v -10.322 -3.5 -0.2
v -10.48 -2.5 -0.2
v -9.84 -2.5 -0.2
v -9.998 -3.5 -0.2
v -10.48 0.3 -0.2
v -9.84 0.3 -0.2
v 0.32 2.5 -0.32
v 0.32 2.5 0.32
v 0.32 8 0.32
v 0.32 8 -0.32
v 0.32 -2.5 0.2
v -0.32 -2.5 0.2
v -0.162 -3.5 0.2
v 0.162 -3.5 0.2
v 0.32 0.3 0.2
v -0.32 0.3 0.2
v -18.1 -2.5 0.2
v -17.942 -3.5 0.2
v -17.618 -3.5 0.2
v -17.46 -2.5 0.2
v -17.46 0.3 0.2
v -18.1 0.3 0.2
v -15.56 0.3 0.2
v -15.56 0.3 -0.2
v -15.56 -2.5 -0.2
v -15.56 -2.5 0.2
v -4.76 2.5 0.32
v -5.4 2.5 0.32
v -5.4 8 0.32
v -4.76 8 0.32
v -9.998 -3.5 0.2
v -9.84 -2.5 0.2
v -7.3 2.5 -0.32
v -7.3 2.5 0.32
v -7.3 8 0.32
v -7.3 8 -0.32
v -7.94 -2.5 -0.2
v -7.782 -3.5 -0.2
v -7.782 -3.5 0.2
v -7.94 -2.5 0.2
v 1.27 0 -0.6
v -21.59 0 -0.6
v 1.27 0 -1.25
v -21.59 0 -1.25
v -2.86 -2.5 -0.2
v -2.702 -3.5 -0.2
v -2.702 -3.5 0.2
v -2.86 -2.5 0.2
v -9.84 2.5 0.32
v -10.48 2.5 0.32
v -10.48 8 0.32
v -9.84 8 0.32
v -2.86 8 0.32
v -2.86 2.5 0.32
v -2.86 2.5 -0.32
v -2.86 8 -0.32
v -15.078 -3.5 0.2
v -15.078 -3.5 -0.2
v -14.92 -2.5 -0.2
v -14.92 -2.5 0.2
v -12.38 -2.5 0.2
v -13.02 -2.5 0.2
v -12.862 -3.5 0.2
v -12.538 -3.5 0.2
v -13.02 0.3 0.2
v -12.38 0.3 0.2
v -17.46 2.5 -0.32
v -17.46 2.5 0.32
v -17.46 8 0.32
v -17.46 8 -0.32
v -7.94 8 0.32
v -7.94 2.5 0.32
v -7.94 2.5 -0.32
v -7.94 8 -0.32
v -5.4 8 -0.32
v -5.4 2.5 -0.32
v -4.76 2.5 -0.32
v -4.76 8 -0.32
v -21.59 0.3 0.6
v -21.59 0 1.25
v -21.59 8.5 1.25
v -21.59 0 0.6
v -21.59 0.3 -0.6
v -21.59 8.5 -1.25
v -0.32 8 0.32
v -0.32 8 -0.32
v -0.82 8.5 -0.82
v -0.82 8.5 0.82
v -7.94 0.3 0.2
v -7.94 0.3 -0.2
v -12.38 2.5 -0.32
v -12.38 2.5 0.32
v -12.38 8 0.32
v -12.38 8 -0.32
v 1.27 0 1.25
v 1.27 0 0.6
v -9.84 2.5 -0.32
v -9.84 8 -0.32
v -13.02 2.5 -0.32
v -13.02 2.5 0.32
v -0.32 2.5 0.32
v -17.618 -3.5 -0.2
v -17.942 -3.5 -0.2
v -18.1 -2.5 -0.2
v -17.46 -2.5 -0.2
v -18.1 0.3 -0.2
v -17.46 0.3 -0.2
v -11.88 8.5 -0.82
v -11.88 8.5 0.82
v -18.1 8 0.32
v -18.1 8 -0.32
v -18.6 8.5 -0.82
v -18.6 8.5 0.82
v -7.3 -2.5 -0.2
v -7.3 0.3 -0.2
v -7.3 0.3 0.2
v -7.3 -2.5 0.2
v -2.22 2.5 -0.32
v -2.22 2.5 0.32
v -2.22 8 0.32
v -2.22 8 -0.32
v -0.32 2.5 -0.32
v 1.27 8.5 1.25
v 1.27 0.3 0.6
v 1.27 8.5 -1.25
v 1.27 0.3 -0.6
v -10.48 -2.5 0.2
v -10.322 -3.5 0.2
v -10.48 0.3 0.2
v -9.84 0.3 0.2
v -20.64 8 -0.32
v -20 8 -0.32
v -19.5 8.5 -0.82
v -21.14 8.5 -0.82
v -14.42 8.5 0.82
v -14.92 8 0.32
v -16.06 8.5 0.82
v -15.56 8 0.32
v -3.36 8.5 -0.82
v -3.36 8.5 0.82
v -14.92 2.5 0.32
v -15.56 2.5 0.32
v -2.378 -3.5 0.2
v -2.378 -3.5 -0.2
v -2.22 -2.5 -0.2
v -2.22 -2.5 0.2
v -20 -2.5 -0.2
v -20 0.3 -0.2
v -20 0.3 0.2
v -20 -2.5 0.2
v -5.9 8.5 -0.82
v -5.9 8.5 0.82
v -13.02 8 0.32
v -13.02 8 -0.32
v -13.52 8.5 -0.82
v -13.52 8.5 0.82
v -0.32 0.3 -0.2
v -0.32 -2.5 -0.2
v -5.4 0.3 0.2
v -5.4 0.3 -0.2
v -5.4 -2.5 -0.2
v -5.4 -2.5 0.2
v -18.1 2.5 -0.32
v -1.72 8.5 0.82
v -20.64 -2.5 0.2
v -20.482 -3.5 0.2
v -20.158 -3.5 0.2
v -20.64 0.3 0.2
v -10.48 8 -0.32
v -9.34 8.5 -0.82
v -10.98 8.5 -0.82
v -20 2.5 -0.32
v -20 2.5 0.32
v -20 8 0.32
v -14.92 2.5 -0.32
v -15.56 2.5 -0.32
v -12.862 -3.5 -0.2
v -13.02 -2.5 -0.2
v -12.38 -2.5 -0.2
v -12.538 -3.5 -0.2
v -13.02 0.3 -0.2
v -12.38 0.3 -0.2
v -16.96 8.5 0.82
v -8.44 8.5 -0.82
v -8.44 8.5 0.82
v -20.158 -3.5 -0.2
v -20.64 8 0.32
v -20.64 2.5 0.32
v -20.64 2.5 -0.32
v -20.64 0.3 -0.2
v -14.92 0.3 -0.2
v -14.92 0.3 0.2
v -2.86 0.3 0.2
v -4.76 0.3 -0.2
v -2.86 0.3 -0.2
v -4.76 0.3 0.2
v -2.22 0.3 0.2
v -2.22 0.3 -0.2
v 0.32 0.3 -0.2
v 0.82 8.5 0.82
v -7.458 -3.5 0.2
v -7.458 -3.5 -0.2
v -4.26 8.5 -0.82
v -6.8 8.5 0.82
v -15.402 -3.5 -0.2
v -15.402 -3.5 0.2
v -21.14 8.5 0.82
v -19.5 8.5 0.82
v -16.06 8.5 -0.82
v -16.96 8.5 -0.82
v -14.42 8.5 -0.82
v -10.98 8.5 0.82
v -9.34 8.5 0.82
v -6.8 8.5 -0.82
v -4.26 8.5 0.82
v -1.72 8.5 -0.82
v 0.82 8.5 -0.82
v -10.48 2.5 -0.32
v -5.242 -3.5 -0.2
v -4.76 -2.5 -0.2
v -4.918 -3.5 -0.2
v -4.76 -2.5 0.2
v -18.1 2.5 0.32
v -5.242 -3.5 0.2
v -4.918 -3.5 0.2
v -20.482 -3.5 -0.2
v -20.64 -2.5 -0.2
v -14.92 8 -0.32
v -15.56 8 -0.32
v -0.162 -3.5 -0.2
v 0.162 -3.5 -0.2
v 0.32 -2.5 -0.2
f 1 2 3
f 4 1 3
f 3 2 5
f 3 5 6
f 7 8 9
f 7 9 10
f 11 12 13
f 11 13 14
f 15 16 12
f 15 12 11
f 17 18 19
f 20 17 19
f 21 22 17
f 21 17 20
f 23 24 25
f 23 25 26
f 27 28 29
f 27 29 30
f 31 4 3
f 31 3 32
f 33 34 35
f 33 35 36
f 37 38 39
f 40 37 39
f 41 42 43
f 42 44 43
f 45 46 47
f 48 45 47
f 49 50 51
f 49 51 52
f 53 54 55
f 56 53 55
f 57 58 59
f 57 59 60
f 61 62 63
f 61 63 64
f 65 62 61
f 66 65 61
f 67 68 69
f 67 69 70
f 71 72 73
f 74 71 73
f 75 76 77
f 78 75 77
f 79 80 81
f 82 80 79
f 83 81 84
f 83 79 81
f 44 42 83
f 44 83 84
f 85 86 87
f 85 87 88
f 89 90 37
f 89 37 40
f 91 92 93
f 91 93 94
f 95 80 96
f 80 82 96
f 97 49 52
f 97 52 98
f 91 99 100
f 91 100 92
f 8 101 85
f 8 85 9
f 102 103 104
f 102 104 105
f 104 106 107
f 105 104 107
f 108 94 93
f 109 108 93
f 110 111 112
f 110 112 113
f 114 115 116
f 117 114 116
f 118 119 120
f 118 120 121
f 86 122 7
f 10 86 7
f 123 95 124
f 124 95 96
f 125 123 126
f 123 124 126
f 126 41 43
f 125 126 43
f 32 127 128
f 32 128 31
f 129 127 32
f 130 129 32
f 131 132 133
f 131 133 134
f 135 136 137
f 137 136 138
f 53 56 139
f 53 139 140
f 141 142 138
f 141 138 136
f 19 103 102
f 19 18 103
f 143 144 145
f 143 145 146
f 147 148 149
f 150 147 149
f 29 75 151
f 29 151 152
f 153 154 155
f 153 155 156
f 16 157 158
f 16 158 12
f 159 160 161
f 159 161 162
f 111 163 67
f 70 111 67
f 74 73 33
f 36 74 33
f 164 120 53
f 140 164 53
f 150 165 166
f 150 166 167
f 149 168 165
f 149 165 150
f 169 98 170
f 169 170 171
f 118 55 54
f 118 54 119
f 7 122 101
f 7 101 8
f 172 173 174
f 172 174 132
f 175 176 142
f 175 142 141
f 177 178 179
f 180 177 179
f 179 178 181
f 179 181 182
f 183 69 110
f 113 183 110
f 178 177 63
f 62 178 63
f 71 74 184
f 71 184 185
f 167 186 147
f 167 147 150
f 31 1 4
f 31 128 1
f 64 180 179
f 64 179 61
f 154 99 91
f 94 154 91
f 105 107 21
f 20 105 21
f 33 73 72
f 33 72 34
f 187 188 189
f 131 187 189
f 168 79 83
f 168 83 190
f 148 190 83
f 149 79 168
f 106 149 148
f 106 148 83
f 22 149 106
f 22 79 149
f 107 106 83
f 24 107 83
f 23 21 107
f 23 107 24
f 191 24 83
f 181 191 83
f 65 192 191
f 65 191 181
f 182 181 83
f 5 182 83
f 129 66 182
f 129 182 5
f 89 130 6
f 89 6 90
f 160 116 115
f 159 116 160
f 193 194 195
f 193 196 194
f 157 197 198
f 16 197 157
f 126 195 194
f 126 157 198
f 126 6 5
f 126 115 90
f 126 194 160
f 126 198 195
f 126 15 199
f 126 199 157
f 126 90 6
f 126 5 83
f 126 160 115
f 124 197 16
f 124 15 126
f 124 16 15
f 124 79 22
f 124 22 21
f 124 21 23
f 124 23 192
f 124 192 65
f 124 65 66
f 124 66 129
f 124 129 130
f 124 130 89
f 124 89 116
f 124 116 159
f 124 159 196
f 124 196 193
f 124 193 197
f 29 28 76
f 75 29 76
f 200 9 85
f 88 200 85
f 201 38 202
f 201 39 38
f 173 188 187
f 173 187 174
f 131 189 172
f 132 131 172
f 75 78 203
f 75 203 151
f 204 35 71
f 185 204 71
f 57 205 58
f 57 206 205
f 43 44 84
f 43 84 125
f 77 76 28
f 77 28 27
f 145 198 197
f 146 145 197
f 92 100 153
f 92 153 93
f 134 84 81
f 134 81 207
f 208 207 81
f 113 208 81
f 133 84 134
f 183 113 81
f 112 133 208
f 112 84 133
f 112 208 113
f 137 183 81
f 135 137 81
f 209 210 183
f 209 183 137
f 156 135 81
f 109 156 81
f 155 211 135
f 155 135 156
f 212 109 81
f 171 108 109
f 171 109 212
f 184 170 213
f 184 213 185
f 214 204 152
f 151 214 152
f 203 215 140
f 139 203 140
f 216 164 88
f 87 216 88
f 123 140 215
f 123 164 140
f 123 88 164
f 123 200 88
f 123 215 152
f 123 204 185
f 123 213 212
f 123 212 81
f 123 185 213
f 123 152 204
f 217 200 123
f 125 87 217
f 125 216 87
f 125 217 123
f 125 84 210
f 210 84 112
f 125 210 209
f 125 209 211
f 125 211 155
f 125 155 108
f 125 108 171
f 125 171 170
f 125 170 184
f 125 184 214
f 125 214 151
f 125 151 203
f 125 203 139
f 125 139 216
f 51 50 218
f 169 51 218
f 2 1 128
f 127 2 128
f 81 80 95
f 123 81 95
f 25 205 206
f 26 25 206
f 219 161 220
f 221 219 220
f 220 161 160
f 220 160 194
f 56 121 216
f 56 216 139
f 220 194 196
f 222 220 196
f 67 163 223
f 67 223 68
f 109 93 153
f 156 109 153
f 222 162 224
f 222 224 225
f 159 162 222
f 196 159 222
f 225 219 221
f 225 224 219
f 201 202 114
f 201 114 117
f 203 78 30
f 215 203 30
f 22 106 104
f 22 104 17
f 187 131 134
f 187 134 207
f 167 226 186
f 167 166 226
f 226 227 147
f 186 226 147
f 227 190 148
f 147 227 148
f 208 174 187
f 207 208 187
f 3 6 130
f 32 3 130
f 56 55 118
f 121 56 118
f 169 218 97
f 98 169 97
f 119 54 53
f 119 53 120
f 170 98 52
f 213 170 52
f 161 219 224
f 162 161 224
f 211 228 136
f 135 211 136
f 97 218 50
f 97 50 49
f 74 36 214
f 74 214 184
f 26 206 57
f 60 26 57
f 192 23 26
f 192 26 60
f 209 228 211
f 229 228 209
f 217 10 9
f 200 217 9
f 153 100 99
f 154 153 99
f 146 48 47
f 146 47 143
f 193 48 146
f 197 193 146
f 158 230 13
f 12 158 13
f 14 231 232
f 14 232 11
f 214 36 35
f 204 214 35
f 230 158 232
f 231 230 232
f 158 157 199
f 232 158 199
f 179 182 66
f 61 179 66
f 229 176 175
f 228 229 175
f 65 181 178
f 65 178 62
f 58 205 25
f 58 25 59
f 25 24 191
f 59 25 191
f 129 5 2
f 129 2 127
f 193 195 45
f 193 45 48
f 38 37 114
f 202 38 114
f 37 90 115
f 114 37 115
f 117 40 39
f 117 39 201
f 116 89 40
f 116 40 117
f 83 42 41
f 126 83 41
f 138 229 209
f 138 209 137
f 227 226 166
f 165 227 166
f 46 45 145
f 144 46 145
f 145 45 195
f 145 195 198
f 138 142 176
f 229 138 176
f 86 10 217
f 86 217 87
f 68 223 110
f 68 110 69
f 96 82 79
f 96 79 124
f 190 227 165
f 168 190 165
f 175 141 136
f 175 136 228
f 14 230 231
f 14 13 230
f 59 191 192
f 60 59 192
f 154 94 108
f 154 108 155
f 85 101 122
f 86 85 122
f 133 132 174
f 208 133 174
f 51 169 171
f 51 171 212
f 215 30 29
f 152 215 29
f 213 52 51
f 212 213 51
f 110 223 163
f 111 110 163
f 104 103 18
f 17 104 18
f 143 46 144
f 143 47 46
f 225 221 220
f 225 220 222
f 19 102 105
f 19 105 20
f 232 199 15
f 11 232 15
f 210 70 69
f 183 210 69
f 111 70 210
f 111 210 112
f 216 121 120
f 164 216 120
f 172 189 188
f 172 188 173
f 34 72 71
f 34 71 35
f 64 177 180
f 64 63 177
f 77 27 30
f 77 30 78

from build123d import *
from OCP.BRepFilletAPI import BRepFilletAPI_MakeChamfer

# Parameters (mm, degrees)
SKETCH1_W                   = 2.54
SKETCH1_H                   = 2.5
BOSS_EXTRUDE1_DEPTH         = 8.5
SKETCH2_W                   = 2.54
SKETCH2_H                   = 1.2
CUT_EXTRUDE1_DEPTH          = 0.3
CUT_EXTRUDE2_START          = -6
SKETCH3_W                   = 0.64
SKETCH3_H                   = 0.64
CUT_EXTRUDE2_DEPTH          = 15.68477979
CHAMFER1_SIZE               = 0.5
SKETCH4_W                   = 0.64
SKETCH4_H                   = 0.4
BOSS_EXTRUDE2_DEPTH         = 3.8
CHAMFER2_SIZE               = 1
CHAMFER2_SIZE2              = 0.15838444
LPATTERN1_COUNT             = 9
LPATTERN1_PITCH             = 2.54
CHAMFER1_OF_LPATTERN1_SIZE  = 0.5
CHAMFER2_OF_LPATTERN1_SIZE  = 1
CHAMFER2_OF_LPATTERN1_SIZE2 = 0.15838444


with BuildPart() as part:
    # Sketch1 → Boss-Extrude1 (new body)
    with BuildSketch(Plane(origin=(0, 0, 0), x_dir=(1, 0, 0), z_dir=(0, 1, 0))):
        Rectangle(SKETCH1_W, SKETCH1_H)
    boss_extrude1 = extrude(amount=BOSS_EXTRUDE1_DEPTH)

    # Sketch2 → Cut-Extrude1 (cut)
    with BuildSketch(Plane.XZ):
        Rectangle(SKETCH2_W, SKETCH2_H)
    cut_extrude1 = extrude(amount=-CUT_EXTRUDE1_DEPTH, mode=Mode.SUBTRACT)

    # Sketch3 → Cut-Extrude2 (cut)
    with BuildSketch(Plane(origin=(0, 8.5, 0), x_dir=(1, 0, 0), z_dir=(0, 1, 0)).offset(CUT_EXTRUDE2_START)):
        Rectangle(SKETCH3_W, SKETCH3_H)
    cut_extrude2 = extrude(amount=CUT_EXTRUDE2_DEPTH, mode=Mode.SUBTRACT)

    # Chamfer1
    chamfer1_edges = [part.edges().sort_by_distance(p)[0] for p in [
        (0, 8.5, 0.32),
        (-0.32, 8.5, 0),
        (0, 8.5, -0.32),
        (0.32, 8.5, 0),
    ]]
    chamfer(chamfer1_edges, length=CHAMFER1_SIZE)

    # Sketch4 → Boss-Extrude2 (add)
    with BuildSketch(Plane.XZ.offset(-0.3)):
        Rectangle(SKETCH4_W, SKETCH4_H)
    boss_extrude2 = extrude(amount=BOSS_EXTRUDE2_DEPTH)

    # Chamfer2: one chamfer whose edges measure the first distance from different faces: ONE call of the kernel's chamfer builder (chamfer() names one face for all edges)
    chamfer2_edges_1 = [part.edges().sort_by_distance(p)[0] for p in [
        (0.32, -3.5, 0),
    ]]
    chamfer2_side_1 = [part.faces().sort_by_distance(p)[0] for p in [
        (0.32, -1.6, 0),
    ]]
    chamfer2_edges_2 = [part.edges().sort_by_distance(p)[0] for p in [
        (-0.32, -3.5, 0),
    ]]
    chamfer2_side_2 = [part.faces().sort_by_distance(p)[0] for p in [
        (-0.32, -1.6, 0),
    ]]
    chamfer2 = BRepFilletAPI_MakeChamfer(part.part.solid().wrapped)
    for e in chamfer2_edges_1:
        chamfer2.Add(CHAMFER2_SIZE, CHAMFER2_SIZE2, e.wrapped, chamfer2_side_1[0].wrapped)  # the first distance lies on this face
    for e in chamfer2_edges_2:
        chamfer2.Add(CHAMFER2_SIZE, CHAMFER2_SIZE2, e.wrapped, chamfer2_side_2[0].wrapped)  # the first distance lies on this face
    add(Compound.cast(chamfer2.Shape()), mode=Mode.REPLACE)

    # LPattern1: Boss-Extrude1, Cut-Extrude1, Cut-Extrude2, Boss-Extrude2 ×9
    with Locations(*[(-i * LPATTERN1_PITCH, 0, 0) for i in range(1, LPATTERN1_COUNT)]):
        add(boss_extrude1)
        add(cut_extrude1, mode=Mode.SUBTRACT)
        add(cut_extrude2, mode=Mode.SUBTRACT)
        add(boss_extrude2)

    # Chamfer1 of LPattern1
    chamfer1_of_lpattern1_edges = [part.edges().sort_by_distance(p)[0] for p in [
        (-2.54, 8.5, 0.32),
        (-2.86, 8.5, 0),
        (-2.54, 8.5, -0.32),
        (-2.22, 8.5, 0),
        (-5.08, 8.5, 0.32),
        (-5.4, 8.5, 0),
        (-5.08, 8.5, -0.32),
        (-4.76, 8.5, 0),
        (-7.62, 8.5, 0.32),
        (-7.94, 8.5, 0),
        (-7.62, 8.5, -0.32),
        (-7.3, 8.5, 0),
        (-10.16, 8.5, 0.32),
        (-10.48, 8.5, 0),
        (-10.16, 8.5, -0.32),
        (-9.84, 8.5, 0),
        (-12.7, 8.5, 0.32),
        (-13.02, 8.5, 0),
        (-12.7, 8.5, -0.32),
        (-12.38, 8.5, 0),
        (-15.24, 8.5, 0.32),
        (-15.56, 8.5, 0),
        (-15.24, 8.5, -0.32),
        (-14.92, 8.5, 0),
        (-17.78, 8.5, 0.32),
        (-18.1, 8.5, 0),
        (-17.78, 8.5, -0.32),
        (-17.46, 8.5, 0),
        (-20.32, 8.5, 0.32),
        (-20.64, 8.5, 0),
        (-20.32, 8.5, -0.32),
        (-20, 8.5, 0),
    ]]
    chamfer(chamfer1_of_lpattern1_edges, length=CHAMFER1_OF_LPATTERN1_SIZE)

    # Chamfer2 of LPattern1: one chamfer whose edges measure the first distance from different faces: ONE call of the kernel's chamfer builder (chamfer() names one face for all edges)
    chamfer2_of_lpattern1_edges_1 = [part.edges().sort_by_distance(p)[0] for p in [
        (-2.22, -3.5, 0),
    ]]
    chamfer2_of_lpattern1_side_1 = [part.faces().sort_by_distance(p)[0] for p in [
        (-2.22, -1.6, 0),
    ]]
    chamfer2_of_lpattern1_edges_2 = [part.edges().sort_by_distance(p)[0] for p in [
        (-2.86, -3.5, 0),
    ]]
    chamfer2_of_lpattern1_side_2 = [part.faces().sort_by_distance(p)[0] for p in [
        (-2.86, -1.6, 0),
    ]]
    chamfer2_of_lpattern1_edges_3 = [part.edges().sort_by_distance(p)[0] for p in [
        (-4.76, -3.5, 0),
    ]]
    chamfer2_of_lpattern1_side_3 = [part.faces().sort_by_distance(p)[0] for p in [
        (-4.76, -1.6, 0),
    ]]
    chamfer2_of_lpattern1_edges_4 = [part.edges().sort_by_distance(p)[0] for p in [
        (-5.4, -3.5, 0),
    ]]
    chamfer2_of_lpattern1_side_4 = [part.faces().sort_by_distance(p)[0] for p in [
        (-5.4, -1.6, 0),
    ]]
    chamfer2_of_lpattern1_edges_5 = [part.edges().sort_by_distance(p)[0] for p in [
        (-7.3, -3.5, 0),
    ]]
    chamfer2_of_lpattern1_side_5 = [part.faces().sort_by_distance(p)[0] for p in [
        (-7.3, -1.6, 0),
    ]]
    chamfer2_of_lpattern1_edges_6 = [part.edges().sort_by_distance(p)[0] for p in [
        (-7.94, -3.5, 0),
    ]]
    chamfer2_of_lpattern1_side_6 = [part.faces().sort_by_distance(p)[0] for p in [
        (-7.94, -1.6, 0),
    ]]
    chamfer2_of_lpattern1_edges_7 = [part.edges().sort_by_distance(p)[0] for p in [
        (-9.84, -3.5, 0),
    ]]
    chamfer2_of_lpattern1_side_7 = [part.faces().sort_by_distance(p)[0] for p in [
        (-9.84, -1.6, 0),
    ]]
    chamfer2_of_lpattern1_edges_8 = [part.edges().sort_by_distance(p)[0] for p in [
        (-10.48, -3.5, 0),
    ]]
    chamfer2_of_lpattern1_side_8 = [part.faces().sort_by_distance(p)[0] for p in [
        (-10.48, -1.6, 0),
    ]]
    chamfer2_of_lpattern1_edges_9 = [part.edges().sort_by_distance(p)[0] for p in [
        (-12.38, -3.5, 0),
    ]]
    chamfer2_of_lpattern1_side_9 = [part.faces().sort_by_distance(p)[0] for p in [
        (-12.38, -1.6, 0),
    ]]
    chamfer2_of_lpattern1_edges_10 = [part.edges().sort_by_distance(p)[0] for p in [
        (-13.02, -3.5, 0),
    ]]
    chamfer2_of_lpattern1_side_10 = [part.faces().sort_by_distance(p)[0] for p in [
        (-13.02, -1.6, 0),
    ]]
    chamfer2_of_lpattern1_edges_11 = [part.edges().sort_by_distance(p)[0] for p in [
        (-14.92, -3.5, 0),
    ]]
    chamfer2_of_lpattern1_side_11 = [part.faces().sort_by_distance(p)[0] for p in [
        (-14.92, -1.6, 0),
    ]]
    chamfer2_of_lpattern1_edges_12 = [part.edges().sort_by_distance(p)[0] for p in [
        (-15.56, -3.5, 0),
    ]]
    chamfer2_of_lpattern1_side_12 = [part.faces().sort_by_distance(p)[0] for p in [
        (-15.56, -1.6, 0),
    ]]
    chamfer2_of_lpattern1_edges_13 = [part.edges().sort_by_distance(p)[0] for p in [
        (-17.46, -3.5, 0),
    ]]
    chamfer2_of_lpattern1_side_13 = [part.faces().sort_by_distance(p)[0] for p in [
        (-17.46, -1.6, 0),
    ]]
    chamfer2_of_lpattern1_edges_14 = [part.edges().sort_by_distance(p)[0] for p in [
        (-18.1, -3.5, 0),
    ]]
    chamfer2_of_lpattern1_side_14 = [part.faces().sort_by_distance(p)[0] for p in [
        (-18.1, -1.6, 0),
    ]]
    chamfer2_of_lpattern1_edges_15 = [part.edges().sort_by_distance(p)[0] for p in [
        (-20, -3.5, 0),
    ]]
    chamfer2_of_lpattern1_side_15 = [part.faces().sort_by_distance(p)[0] for p in [
        (-20, -1.6, 0),
    ]]
    chamfer2_of_lpattern1_edges_16 = [part.edges().sort_by_distance(p)[0] for p in [
        (-20.64, -3.5, 0),
    ]]
    chamfer2_of_lpattern1_side_16 = [part.faces().sort_by_distance(p)[0] for p in [
        (-20.64, -1.6, 0),
    ]]
    chamfer2_of_lpattern1 = BRepFilletAPI_MakeChamfer(part.part.solid().wrapped)
    for e in chamfer2_of_lpattern1_edges_1:
        chamfer2_of_lpattern1.Add(CHAMFER2_OF_LPATTERN1_SIZE, CHAMFER2_OF_LPATTERN1_SIZE2, e.wrapped, chamfer2_of_lpattern1_side_1[0].wrapped)  # the first distance lies on this face
    for e in chamfer2_of_lpattern1_edges_2:
        chamfer2_of_lpattern1.Add(CHAMFER2_OF_LPATTERN1_SIZE, CHAMFER2_OF_LPATTERN1_SIZE2, e.wrapped, chamfer2_of_lpattern1_side_2[0].wrapped)  # the first distance lies on this face
    for e in chamfer2_of_lpattern1_edges_3:
        chamfer2_of_lpattern1.Add(CHAMFER2_OF_LPATTERN1_SIZE, CHAMFER2_OF_LPATTERN1_SIZE2, e.wrapped, chamfer2_of_lpattern1_side_3[0].wrapped)  # the first distance lies on this face
    for e in chamfer2_of_lpattern1_edges_4:
        chamfer2_of_lpattern1.Add(CHAMFER2_OF_LPATTERN1_SIZE, CHAMFER2_OF_LPATTERN1_SIZE2, e.wrapped, chamfer2_of_lpattern1_side_4[0].wrapped)  # the first distance lies on this face
    for e in chamfer2_of_lpattern1_edges_5:
        chamfer2_of_lpattern1.Add(CHAMFER2_OF_LPATTERN1_SIZE, CHAMFER2_OF_LPATTERN1_SIZE2, e.wrapped, chamfer2_of_lpattern1_side_5[0].wrapped)  # the first distance lies on this face
    for e in chamfer2_of_lpattern1_edges_6:
        chamfer2_of_lpattern1.Add(CHAMFER2_OF_LPATTERN1_SIZE, CHAMFER2_OF_LPATTERN1_SIZE2, e.wrapped, chamfer2_of_lpattern1_side_6[0].wrapped)  # the first distance lies on this face
    for e in chamfer2_of_lpattern1_edges_7:
        chamfer2_of_lpattern1.Add(CHAMFER2_OF_LPATTERN1_SIZE, CHAMFER2_OF_LPATTERN1_SIZE2, e.wrapped, chamfer2_of_lpattern1_side_7[0].wrapped)  # the first distance lies on this face
    for e in chamfer2_of_lpattern1_edges_8:
        chamfer2_of_lpattern1.Add(CHAMFER2_OF_LPATTERN1_SIZE, CHAMFER2_OF_LPATTERN1_SIZE2, e.wrapped, chamfer2_of_lpattern1_side_8[0].wrapped)  # the first distance lies on this face
    for e in chamfer2_of_lpattern1_edges_9:
        chamfer2_of_lpattern1.Add(CHAMFER2_OF_LPATTERN1_SIZE, CHAMFER2_OF_LPATTERN1_SIZE2, e.wrapped, chamfer2_of_lpattern1_side_9[0].wrapped)  # the first distance lies on this face
    for e in chamfer2_of_lpattern1_edges_10:
        chamfer2_of_lpattern1.Add(CHAMFER2_OF_LPATTERN1_SIZE, CHAMFER2_OF_LPATTERN1_SIZE2, e.wrapped, chamfer2_of_lpattern1_side_10[0].wrapped)  # the first distance lies on this face
    for e in chamfer2_of_lpattern1_edges_11:
        chamfer2_of_lpattern1.Add(CHAMFER2_OF_LPATTERN1_SIZE, CHAMFER2_OF_LPATTERN1_SIZE2, e.wrapped, chamfer2_of_lpattern1_side_11[0].wrapped)  # the first distance lies on this face
    for e in chamfer2_of_lpattern1_edges_12:
        chamfer2_of_lpattern1.Add(CHAMFER2_OF_LPATTERN1_SIZE, CHAMFER2_OF_LPATTERN1_SIZE2, e.wrapped, chamfer2_of_lpattern1_side_12[0].wrapped)  # the first distance lies on this face
    for e in chamfer2_of_lpattern1_edges_13:
        chamfer2_of_lpattern1.Add(CHAMFER2_OF_LPATTERN1_SIZE, CHAMFER2_OF_LPATTERN1_SIZE2, e.wrapped, chamfer2_of_lpattern1_side_13[0].wrapped)  # the first distance lies on this face
    for e in chamfer2_of_lpattern1_edges_14:
        chamfer2_of_lpattern1.Add(CHAMFER2_OF_LPATTERN1_SIZE, CHAMFER2_OF_LPATTERN1_SIZE2, e.wrapped, chamfer2_of_lpattern1_side_14[0].wrapped)  # the first distance lies on this face
    for e in chamfer2_of_lpattern1_edges_15:
        chamfer2_of_lpattern1.Add(CHAMFER2_OF_LPATTERN1_SIZE, CHAMFER2_OF_LPATTERN1_SIZE2, e.wrapped, chamfer2_of_lpattern1_side_15[0].wrapped)  # the first distance lies on this face
    for e in chamfer2_of_lpattern1_edges_16:
        chamfer2_of_lpattern1.Add(CHAMFER2_OF_LPATTERN1_SIZE, CHAMFER2_OF_LPATTERN1_SIZE2, e.wrapped, chamfer2_of_lpattern1_side_16[0].wrapped)  # the first distance lies on this face
    add(Compound.cast(chamfer2_of_lpattern1.Shape()), mode=Mode.REPLACE)


solid = part.part
